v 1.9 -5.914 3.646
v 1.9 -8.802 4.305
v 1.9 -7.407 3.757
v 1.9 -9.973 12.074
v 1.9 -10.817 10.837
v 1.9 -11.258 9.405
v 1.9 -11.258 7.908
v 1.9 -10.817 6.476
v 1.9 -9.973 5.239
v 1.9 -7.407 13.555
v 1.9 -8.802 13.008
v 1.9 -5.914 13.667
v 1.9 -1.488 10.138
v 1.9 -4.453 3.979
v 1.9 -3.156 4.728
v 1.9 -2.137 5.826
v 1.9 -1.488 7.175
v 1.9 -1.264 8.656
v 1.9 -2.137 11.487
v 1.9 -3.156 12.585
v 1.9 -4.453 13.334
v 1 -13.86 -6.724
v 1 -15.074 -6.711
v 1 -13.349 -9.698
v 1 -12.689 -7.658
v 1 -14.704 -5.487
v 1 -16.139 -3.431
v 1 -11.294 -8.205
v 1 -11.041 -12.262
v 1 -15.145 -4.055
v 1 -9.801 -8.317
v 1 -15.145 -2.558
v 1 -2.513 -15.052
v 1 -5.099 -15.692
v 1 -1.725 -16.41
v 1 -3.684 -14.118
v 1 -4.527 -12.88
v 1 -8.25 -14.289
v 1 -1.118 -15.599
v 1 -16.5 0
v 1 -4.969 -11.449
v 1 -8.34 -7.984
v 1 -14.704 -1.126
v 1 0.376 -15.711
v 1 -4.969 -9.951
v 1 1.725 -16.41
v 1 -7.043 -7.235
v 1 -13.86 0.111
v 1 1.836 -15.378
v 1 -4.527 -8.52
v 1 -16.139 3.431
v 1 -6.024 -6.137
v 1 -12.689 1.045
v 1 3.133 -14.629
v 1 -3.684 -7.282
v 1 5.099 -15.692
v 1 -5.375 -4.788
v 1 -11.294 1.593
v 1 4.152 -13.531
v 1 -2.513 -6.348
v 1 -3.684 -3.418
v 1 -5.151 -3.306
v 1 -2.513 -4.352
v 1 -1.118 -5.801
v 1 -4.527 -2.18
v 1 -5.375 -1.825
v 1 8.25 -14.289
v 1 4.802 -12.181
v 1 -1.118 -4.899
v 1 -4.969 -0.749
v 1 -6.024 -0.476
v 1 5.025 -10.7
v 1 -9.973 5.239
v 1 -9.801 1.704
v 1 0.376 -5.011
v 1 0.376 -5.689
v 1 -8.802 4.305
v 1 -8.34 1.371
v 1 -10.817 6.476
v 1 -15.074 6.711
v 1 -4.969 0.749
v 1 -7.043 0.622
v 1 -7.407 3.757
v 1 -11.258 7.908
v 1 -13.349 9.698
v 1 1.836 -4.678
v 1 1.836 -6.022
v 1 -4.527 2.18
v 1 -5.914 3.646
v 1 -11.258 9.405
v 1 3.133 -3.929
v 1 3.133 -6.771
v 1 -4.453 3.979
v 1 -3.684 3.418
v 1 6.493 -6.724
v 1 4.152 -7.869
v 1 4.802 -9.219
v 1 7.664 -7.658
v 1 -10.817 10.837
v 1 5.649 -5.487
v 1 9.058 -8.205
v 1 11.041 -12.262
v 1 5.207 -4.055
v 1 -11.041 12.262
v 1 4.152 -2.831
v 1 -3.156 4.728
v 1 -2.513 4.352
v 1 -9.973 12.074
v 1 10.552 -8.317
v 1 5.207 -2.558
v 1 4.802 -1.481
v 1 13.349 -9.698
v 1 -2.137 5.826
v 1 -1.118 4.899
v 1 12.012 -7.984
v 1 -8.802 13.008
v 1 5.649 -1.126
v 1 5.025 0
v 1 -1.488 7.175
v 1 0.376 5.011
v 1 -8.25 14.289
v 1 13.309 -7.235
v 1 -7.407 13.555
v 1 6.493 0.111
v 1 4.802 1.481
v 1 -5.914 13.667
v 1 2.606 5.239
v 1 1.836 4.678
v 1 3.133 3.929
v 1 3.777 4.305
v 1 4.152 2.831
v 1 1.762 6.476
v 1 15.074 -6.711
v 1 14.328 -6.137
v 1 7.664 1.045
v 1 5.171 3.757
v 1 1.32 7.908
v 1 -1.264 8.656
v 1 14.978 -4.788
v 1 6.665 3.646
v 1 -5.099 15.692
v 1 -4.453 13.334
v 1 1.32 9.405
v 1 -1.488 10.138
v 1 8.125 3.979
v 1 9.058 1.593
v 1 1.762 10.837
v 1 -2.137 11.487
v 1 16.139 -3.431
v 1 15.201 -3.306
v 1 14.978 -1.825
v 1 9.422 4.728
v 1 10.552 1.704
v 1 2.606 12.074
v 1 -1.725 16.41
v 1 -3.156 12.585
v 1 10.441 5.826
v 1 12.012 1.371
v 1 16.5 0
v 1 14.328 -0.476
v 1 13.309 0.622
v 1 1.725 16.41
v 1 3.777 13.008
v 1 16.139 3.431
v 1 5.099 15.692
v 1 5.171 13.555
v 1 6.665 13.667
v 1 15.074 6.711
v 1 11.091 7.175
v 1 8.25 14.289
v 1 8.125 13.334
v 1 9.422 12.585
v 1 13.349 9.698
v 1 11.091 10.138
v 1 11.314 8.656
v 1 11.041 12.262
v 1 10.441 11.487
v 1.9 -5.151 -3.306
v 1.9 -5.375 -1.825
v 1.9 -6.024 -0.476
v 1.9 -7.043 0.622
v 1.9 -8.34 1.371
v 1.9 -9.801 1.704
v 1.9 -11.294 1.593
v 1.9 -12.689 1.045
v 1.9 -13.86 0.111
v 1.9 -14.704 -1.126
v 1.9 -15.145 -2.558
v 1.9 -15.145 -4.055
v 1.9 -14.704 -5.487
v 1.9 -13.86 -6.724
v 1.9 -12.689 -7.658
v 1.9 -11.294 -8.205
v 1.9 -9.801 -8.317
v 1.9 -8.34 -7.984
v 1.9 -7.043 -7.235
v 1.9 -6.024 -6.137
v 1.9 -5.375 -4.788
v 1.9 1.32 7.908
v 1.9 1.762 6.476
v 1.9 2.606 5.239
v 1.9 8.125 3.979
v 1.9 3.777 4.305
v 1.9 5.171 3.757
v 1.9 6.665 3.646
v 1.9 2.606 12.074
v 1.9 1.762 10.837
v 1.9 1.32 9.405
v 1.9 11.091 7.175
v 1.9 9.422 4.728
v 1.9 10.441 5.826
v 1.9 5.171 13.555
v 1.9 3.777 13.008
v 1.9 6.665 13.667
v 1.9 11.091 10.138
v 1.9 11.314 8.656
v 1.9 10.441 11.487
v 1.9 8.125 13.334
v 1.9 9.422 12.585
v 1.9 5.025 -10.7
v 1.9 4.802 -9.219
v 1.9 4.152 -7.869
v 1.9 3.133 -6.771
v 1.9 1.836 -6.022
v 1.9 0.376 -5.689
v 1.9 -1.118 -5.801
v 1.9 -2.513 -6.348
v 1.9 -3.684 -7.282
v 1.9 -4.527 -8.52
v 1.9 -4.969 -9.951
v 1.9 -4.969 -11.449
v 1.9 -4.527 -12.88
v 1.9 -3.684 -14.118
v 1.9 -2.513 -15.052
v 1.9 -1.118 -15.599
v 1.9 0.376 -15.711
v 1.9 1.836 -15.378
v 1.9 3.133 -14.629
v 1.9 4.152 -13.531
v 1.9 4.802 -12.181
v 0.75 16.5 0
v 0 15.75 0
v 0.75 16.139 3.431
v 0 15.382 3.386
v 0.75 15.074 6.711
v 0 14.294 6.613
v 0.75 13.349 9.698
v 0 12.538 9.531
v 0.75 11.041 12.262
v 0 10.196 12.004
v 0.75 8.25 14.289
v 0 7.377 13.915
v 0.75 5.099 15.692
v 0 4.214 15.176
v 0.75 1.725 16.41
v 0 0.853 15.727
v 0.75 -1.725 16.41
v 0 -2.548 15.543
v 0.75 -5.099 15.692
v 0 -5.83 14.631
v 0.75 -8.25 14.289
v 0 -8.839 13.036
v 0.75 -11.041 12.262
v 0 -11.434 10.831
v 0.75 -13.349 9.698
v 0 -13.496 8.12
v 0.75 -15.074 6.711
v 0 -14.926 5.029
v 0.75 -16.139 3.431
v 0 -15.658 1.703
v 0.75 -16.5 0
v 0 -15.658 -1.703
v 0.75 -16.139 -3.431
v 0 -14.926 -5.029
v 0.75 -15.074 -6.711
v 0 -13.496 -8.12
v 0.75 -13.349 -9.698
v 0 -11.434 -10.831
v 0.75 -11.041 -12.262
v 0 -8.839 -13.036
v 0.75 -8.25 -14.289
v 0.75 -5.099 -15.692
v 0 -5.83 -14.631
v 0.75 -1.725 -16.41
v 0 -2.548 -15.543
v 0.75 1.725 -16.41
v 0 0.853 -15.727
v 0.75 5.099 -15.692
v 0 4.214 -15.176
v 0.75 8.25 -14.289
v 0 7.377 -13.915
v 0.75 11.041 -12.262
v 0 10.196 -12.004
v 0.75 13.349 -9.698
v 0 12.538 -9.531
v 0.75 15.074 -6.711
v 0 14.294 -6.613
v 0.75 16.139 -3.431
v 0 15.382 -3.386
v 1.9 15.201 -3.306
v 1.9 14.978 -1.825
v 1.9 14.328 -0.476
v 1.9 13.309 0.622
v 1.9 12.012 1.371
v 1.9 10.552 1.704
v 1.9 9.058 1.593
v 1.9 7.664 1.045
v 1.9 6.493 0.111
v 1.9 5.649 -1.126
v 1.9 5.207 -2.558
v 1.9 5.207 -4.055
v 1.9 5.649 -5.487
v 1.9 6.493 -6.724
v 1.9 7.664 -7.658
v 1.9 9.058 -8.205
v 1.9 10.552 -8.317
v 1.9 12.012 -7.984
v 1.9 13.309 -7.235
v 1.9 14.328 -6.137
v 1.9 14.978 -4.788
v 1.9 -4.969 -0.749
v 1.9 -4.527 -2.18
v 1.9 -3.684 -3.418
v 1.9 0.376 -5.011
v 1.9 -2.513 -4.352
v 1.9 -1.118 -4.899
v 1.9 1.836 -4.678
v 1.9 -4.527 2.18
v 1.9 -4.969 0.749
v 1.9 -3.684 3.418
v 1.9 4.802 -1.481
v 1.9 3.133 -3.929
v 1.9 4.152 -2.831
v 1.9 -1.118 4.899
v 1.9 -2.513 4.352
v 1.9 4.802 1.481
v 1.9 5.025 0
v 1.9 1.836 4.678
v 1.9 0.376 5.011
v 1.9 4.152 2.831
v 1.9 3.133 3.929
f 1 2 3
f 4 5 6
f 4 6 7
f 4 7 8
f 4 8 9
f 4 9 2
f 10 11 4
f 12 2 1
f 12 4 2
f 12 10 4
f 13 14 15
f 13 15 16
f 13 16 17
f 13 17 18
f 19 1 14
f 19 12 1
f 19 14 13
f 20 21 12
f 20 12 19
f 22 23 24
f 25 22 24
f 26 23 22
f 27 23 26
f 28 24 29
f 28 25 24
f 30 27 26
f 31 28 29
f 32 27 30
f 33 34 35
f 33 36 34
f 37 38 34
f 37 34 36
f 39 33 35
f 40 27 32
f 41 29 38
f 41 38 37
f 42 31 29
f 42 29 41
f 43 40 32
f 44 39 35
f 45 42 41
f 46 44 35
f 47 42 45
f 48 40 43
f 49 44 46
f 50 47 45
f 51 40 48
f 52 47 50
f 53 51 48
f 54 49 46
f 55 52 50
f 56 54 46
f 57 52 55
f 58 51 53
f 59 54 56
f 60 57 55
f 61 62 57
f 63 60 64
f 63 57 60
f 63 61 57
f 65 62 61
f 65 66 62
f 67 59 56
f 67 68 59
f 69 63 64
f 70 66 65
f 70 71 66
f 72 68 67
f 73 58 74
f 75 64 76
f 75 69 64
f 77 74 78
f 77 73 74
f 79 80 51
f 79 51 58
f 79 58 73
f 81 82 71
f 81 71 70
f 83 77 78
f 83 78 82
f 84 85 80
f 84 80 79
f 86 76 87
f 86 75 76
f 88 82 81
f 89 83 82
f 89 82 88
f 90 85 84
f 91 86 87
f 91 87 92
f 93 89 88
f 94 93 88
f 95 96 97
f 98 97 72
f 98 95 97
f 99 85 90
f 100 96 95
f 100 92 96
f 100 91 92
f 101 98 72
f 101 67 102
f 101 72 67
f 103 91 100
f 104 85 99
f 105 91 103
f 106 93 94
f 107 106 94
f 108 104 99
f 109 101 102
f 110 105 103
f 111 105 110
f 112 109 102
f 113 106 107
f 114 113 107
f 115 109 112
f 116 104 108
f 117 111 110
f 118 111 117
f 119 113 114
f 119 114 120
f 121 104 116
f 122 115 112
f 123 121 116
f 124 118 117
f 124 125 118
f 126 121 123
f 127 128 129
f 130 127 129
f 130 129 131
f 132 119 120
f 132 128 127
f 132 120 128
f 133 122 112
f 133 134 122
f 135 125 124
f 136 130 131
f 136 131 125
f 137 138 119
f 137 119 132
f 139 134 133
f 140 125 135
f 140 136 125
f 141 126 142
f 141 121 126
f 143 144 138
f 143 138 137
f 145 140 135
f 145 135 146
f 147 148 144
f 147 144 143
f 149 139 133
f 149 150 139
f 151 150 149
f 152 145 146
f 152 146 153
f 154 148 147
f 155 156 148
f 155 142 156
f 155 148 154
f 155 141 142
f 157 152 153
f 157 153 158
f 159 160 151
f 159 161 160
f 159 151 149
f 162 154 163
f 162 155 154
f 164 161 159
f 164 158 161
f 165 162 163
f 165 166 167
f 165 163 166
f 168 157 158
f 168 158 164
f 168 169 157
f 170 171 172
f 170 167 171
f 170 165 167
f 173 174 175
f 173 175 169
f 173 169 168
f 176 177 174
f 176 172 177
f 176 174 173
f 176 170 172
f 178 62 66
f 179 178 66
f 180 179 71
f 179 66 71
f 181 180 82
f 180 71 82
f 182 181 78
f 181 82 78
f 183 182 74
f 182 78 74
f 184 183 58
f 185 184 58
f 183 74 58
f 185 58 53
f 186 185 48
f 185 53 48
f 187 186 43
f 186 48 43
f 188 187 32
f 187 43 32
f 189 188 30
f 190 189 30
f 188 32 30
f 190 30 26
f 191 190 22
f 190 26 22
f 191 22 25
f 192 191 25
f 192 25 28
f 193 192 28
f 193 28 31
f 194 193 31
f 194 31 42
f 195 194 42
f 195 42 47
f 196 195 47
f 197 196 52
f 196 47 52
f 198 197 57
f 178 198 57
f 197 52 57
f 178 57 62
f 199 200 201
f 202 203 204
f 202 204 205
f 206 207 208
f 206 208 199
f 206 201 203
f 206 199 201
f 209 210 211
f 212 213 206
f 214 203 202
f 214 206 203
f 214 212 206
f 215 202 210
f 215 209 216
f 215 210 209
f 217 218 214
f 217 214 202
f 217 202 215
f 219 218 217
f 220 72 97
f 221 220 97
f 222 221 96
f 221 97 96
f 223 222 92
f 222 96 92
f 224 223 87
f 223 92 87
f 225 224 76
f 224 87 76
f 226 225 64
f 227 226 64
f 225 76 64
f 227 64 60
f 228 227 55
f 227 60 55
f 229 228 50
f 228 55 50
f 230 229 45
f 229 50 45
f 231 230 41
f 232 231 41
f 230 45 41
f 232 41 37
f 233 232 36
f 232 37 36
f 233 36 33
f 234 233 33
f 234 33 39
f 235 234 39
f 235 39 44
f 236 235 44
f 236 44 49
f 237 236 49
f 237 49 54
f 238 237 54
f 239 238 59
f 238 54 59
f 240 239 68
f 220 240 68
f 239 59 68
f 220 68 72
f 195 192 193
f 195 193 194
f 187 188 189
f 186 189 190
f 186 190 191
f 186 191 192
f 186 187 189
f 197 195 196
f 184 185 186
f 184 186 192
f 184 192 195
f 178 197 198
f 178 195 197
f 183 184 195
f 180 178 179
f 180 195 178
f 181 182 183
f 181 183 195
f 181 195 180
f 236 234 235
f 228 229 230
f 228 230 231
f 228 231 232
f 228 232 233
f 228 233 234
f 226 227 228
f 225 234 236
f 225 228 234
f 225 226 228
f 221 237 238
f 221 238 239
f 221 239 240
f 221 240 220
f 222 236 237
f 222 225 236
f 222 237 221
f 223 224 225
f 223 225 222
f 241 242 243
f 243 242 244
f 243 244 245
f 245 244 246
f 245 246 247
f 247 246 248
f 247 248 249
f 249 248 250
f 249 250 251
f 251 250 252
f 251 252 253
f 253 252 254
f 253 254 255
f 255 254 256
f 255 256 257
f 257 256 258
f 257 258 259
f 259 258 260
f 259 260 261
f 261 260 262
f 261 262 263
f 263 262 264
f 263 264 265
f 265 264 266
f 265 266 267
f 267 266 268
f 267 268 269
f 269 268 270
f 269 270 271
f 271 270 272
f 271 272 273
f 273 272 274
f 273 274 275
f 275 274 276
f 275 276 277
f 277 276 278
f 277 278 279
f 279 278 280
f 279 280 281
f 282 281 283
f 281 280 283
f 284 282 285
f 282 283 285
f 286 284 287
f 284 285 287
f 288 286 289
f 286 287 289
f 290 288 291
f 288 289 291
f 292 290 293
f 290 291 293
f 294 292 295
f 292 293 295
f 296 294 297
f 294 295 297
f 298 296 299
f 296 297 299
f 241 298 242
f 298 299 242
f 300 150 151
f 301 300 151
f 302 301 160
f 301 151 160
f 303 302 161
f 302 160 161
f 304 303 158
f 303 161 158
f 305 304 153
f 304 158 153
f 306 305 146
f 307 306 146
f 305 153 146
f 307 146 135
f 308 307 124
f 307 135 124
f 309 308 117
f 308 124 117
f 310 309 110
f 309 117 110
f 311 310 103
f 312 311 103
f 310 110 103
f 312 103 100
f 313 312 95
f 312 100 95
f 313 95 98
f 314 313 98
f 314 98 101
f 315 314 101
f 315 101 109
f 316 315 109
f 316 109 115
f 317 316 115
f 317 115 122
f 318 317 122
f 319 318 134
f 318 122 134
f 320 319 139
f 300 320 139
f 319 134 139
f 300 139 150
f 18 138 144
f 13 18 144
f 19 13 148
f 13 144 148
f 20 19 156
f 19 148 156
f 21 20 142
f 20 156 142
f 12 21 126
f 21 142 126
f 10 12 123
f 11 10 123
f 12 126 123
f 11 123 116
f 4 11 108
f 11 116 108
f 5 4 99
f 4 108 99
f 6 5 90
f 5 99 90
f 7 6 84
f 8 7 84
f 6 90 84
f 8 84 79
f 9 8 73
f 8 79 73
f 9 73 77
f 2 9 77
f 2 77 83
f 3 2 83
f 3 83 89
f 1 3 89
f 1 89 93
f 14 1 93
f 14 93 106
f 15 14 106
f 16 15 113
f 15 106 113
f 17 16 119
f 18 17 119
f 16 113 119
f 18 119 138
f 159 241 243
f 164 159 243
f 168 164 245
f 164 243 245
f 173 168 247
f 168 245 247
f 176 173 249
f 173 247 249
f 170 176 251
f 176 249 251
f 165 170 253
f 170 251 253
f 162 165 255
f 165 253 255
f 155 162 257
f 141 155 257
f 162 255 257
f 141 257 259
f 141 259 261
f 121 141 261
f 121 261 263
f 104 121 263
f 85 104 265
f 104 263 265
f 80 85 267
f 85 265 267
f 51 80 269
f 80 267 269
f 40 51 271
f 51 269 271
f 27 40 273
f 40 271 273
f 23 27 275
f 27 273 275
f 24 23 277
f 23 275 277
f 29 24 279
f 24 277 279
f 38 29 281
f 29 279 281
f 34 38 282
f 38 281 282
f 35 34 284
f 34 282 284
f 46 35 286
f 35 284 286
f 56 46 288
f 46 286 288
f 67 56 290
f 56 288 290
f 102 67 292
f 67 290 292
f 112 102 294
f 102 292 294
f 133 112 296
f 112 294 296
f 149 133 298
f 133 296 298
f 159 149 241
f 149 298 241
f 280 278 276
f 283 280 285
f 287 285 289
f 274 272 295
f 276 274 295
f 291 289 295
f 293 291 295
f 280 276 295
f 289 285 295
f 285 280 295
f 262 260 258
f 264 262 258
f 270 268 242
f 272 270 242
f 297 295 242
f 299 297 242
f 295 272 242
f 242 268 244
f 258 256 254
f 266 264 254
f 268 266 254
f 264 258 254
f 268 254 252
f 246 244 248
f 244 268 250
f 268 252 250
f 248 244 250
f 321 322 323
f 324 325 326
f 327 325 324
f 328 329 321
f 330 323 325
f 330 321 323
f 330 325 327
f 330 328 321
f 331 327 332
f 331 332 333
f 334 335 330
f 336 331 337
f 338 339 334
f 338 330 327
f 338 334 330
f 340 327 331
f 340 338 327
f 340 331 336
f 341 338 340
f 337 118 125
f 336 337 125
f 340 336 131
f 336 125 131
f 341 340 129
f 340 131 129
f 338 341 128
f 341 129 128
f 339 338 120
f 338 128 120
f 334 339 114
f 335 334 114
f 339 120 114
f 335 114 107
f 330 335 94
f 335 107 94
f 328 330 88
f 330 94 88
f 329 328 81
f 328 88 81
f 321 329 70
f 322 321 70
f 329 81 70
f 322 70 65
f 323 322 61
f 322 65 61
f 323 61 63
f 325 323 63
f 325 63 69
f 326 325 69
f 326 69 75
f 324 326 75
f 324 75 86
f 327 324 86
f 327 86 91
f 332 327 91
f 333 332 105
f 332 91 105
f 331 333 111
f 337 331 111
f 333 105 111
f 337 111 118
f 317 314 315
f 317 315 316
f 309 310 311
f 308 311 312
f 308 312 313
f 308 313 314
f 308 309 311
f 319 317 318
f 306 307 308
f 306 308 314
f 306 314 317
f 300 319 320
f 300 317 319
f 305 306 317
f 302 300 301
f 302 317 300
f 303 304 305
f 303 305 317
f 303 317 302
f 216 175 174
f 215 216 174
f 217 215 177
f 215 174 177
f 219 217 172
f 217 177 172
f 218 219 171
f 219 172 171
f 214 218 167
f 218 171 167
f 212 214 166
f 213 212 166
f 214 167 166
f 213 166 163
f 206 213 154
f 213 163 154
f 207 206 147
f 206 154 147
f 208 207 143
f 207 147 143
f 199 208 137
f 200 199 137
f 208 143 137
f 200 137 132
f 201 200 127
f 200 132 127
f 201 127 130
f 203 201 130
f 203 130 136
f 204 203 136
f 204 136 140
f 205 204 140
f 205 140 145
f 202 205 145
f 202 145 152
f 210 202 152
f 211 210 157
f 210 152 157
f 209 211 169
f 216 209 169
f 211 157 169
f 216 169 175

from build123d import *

# Parameters (mm, degrees)
F0_R     = 16.5
F1_DEPTH = 1
F2_R     = 5.025
F3_DEPTH = 0.9
F4_SIZE  = 0.75


with BuildPart() as f1:
    # F0 (on Right) → F1 (new body)
    with BuildSketch(Plane.YZ):
        Circle(F0_R)
    extrude(amount=F1_DEPTH)

    # F2 (on face) → F3 (join)
    with BuildSketch(Plane.YZ.offset(1)):
        Circle(F2_R)
        with Locations((0, -10.7)):
            Circle(F2_R)
        with Locations((10.176305, -3.306482)):
            Circle(F2_R)
        with Locations((6.289302, 8.656482)):
            Circle(F2_R)
        with Locations((-6.289302, 8.656482)):
            Circle(F2_R)
        with Locations((-10.176305, -3.306482)):
            Circle(F2_R)
    extrude(amount=F3_DEPTH)

    # F4
    f4_edges = [f1.edges().sort_by_distance(p)[0] for p in [
        (0, -16.5, 0),
    ]]
    chamfer(f4_edges, length=F4_SIZE)


solid = f1.part
